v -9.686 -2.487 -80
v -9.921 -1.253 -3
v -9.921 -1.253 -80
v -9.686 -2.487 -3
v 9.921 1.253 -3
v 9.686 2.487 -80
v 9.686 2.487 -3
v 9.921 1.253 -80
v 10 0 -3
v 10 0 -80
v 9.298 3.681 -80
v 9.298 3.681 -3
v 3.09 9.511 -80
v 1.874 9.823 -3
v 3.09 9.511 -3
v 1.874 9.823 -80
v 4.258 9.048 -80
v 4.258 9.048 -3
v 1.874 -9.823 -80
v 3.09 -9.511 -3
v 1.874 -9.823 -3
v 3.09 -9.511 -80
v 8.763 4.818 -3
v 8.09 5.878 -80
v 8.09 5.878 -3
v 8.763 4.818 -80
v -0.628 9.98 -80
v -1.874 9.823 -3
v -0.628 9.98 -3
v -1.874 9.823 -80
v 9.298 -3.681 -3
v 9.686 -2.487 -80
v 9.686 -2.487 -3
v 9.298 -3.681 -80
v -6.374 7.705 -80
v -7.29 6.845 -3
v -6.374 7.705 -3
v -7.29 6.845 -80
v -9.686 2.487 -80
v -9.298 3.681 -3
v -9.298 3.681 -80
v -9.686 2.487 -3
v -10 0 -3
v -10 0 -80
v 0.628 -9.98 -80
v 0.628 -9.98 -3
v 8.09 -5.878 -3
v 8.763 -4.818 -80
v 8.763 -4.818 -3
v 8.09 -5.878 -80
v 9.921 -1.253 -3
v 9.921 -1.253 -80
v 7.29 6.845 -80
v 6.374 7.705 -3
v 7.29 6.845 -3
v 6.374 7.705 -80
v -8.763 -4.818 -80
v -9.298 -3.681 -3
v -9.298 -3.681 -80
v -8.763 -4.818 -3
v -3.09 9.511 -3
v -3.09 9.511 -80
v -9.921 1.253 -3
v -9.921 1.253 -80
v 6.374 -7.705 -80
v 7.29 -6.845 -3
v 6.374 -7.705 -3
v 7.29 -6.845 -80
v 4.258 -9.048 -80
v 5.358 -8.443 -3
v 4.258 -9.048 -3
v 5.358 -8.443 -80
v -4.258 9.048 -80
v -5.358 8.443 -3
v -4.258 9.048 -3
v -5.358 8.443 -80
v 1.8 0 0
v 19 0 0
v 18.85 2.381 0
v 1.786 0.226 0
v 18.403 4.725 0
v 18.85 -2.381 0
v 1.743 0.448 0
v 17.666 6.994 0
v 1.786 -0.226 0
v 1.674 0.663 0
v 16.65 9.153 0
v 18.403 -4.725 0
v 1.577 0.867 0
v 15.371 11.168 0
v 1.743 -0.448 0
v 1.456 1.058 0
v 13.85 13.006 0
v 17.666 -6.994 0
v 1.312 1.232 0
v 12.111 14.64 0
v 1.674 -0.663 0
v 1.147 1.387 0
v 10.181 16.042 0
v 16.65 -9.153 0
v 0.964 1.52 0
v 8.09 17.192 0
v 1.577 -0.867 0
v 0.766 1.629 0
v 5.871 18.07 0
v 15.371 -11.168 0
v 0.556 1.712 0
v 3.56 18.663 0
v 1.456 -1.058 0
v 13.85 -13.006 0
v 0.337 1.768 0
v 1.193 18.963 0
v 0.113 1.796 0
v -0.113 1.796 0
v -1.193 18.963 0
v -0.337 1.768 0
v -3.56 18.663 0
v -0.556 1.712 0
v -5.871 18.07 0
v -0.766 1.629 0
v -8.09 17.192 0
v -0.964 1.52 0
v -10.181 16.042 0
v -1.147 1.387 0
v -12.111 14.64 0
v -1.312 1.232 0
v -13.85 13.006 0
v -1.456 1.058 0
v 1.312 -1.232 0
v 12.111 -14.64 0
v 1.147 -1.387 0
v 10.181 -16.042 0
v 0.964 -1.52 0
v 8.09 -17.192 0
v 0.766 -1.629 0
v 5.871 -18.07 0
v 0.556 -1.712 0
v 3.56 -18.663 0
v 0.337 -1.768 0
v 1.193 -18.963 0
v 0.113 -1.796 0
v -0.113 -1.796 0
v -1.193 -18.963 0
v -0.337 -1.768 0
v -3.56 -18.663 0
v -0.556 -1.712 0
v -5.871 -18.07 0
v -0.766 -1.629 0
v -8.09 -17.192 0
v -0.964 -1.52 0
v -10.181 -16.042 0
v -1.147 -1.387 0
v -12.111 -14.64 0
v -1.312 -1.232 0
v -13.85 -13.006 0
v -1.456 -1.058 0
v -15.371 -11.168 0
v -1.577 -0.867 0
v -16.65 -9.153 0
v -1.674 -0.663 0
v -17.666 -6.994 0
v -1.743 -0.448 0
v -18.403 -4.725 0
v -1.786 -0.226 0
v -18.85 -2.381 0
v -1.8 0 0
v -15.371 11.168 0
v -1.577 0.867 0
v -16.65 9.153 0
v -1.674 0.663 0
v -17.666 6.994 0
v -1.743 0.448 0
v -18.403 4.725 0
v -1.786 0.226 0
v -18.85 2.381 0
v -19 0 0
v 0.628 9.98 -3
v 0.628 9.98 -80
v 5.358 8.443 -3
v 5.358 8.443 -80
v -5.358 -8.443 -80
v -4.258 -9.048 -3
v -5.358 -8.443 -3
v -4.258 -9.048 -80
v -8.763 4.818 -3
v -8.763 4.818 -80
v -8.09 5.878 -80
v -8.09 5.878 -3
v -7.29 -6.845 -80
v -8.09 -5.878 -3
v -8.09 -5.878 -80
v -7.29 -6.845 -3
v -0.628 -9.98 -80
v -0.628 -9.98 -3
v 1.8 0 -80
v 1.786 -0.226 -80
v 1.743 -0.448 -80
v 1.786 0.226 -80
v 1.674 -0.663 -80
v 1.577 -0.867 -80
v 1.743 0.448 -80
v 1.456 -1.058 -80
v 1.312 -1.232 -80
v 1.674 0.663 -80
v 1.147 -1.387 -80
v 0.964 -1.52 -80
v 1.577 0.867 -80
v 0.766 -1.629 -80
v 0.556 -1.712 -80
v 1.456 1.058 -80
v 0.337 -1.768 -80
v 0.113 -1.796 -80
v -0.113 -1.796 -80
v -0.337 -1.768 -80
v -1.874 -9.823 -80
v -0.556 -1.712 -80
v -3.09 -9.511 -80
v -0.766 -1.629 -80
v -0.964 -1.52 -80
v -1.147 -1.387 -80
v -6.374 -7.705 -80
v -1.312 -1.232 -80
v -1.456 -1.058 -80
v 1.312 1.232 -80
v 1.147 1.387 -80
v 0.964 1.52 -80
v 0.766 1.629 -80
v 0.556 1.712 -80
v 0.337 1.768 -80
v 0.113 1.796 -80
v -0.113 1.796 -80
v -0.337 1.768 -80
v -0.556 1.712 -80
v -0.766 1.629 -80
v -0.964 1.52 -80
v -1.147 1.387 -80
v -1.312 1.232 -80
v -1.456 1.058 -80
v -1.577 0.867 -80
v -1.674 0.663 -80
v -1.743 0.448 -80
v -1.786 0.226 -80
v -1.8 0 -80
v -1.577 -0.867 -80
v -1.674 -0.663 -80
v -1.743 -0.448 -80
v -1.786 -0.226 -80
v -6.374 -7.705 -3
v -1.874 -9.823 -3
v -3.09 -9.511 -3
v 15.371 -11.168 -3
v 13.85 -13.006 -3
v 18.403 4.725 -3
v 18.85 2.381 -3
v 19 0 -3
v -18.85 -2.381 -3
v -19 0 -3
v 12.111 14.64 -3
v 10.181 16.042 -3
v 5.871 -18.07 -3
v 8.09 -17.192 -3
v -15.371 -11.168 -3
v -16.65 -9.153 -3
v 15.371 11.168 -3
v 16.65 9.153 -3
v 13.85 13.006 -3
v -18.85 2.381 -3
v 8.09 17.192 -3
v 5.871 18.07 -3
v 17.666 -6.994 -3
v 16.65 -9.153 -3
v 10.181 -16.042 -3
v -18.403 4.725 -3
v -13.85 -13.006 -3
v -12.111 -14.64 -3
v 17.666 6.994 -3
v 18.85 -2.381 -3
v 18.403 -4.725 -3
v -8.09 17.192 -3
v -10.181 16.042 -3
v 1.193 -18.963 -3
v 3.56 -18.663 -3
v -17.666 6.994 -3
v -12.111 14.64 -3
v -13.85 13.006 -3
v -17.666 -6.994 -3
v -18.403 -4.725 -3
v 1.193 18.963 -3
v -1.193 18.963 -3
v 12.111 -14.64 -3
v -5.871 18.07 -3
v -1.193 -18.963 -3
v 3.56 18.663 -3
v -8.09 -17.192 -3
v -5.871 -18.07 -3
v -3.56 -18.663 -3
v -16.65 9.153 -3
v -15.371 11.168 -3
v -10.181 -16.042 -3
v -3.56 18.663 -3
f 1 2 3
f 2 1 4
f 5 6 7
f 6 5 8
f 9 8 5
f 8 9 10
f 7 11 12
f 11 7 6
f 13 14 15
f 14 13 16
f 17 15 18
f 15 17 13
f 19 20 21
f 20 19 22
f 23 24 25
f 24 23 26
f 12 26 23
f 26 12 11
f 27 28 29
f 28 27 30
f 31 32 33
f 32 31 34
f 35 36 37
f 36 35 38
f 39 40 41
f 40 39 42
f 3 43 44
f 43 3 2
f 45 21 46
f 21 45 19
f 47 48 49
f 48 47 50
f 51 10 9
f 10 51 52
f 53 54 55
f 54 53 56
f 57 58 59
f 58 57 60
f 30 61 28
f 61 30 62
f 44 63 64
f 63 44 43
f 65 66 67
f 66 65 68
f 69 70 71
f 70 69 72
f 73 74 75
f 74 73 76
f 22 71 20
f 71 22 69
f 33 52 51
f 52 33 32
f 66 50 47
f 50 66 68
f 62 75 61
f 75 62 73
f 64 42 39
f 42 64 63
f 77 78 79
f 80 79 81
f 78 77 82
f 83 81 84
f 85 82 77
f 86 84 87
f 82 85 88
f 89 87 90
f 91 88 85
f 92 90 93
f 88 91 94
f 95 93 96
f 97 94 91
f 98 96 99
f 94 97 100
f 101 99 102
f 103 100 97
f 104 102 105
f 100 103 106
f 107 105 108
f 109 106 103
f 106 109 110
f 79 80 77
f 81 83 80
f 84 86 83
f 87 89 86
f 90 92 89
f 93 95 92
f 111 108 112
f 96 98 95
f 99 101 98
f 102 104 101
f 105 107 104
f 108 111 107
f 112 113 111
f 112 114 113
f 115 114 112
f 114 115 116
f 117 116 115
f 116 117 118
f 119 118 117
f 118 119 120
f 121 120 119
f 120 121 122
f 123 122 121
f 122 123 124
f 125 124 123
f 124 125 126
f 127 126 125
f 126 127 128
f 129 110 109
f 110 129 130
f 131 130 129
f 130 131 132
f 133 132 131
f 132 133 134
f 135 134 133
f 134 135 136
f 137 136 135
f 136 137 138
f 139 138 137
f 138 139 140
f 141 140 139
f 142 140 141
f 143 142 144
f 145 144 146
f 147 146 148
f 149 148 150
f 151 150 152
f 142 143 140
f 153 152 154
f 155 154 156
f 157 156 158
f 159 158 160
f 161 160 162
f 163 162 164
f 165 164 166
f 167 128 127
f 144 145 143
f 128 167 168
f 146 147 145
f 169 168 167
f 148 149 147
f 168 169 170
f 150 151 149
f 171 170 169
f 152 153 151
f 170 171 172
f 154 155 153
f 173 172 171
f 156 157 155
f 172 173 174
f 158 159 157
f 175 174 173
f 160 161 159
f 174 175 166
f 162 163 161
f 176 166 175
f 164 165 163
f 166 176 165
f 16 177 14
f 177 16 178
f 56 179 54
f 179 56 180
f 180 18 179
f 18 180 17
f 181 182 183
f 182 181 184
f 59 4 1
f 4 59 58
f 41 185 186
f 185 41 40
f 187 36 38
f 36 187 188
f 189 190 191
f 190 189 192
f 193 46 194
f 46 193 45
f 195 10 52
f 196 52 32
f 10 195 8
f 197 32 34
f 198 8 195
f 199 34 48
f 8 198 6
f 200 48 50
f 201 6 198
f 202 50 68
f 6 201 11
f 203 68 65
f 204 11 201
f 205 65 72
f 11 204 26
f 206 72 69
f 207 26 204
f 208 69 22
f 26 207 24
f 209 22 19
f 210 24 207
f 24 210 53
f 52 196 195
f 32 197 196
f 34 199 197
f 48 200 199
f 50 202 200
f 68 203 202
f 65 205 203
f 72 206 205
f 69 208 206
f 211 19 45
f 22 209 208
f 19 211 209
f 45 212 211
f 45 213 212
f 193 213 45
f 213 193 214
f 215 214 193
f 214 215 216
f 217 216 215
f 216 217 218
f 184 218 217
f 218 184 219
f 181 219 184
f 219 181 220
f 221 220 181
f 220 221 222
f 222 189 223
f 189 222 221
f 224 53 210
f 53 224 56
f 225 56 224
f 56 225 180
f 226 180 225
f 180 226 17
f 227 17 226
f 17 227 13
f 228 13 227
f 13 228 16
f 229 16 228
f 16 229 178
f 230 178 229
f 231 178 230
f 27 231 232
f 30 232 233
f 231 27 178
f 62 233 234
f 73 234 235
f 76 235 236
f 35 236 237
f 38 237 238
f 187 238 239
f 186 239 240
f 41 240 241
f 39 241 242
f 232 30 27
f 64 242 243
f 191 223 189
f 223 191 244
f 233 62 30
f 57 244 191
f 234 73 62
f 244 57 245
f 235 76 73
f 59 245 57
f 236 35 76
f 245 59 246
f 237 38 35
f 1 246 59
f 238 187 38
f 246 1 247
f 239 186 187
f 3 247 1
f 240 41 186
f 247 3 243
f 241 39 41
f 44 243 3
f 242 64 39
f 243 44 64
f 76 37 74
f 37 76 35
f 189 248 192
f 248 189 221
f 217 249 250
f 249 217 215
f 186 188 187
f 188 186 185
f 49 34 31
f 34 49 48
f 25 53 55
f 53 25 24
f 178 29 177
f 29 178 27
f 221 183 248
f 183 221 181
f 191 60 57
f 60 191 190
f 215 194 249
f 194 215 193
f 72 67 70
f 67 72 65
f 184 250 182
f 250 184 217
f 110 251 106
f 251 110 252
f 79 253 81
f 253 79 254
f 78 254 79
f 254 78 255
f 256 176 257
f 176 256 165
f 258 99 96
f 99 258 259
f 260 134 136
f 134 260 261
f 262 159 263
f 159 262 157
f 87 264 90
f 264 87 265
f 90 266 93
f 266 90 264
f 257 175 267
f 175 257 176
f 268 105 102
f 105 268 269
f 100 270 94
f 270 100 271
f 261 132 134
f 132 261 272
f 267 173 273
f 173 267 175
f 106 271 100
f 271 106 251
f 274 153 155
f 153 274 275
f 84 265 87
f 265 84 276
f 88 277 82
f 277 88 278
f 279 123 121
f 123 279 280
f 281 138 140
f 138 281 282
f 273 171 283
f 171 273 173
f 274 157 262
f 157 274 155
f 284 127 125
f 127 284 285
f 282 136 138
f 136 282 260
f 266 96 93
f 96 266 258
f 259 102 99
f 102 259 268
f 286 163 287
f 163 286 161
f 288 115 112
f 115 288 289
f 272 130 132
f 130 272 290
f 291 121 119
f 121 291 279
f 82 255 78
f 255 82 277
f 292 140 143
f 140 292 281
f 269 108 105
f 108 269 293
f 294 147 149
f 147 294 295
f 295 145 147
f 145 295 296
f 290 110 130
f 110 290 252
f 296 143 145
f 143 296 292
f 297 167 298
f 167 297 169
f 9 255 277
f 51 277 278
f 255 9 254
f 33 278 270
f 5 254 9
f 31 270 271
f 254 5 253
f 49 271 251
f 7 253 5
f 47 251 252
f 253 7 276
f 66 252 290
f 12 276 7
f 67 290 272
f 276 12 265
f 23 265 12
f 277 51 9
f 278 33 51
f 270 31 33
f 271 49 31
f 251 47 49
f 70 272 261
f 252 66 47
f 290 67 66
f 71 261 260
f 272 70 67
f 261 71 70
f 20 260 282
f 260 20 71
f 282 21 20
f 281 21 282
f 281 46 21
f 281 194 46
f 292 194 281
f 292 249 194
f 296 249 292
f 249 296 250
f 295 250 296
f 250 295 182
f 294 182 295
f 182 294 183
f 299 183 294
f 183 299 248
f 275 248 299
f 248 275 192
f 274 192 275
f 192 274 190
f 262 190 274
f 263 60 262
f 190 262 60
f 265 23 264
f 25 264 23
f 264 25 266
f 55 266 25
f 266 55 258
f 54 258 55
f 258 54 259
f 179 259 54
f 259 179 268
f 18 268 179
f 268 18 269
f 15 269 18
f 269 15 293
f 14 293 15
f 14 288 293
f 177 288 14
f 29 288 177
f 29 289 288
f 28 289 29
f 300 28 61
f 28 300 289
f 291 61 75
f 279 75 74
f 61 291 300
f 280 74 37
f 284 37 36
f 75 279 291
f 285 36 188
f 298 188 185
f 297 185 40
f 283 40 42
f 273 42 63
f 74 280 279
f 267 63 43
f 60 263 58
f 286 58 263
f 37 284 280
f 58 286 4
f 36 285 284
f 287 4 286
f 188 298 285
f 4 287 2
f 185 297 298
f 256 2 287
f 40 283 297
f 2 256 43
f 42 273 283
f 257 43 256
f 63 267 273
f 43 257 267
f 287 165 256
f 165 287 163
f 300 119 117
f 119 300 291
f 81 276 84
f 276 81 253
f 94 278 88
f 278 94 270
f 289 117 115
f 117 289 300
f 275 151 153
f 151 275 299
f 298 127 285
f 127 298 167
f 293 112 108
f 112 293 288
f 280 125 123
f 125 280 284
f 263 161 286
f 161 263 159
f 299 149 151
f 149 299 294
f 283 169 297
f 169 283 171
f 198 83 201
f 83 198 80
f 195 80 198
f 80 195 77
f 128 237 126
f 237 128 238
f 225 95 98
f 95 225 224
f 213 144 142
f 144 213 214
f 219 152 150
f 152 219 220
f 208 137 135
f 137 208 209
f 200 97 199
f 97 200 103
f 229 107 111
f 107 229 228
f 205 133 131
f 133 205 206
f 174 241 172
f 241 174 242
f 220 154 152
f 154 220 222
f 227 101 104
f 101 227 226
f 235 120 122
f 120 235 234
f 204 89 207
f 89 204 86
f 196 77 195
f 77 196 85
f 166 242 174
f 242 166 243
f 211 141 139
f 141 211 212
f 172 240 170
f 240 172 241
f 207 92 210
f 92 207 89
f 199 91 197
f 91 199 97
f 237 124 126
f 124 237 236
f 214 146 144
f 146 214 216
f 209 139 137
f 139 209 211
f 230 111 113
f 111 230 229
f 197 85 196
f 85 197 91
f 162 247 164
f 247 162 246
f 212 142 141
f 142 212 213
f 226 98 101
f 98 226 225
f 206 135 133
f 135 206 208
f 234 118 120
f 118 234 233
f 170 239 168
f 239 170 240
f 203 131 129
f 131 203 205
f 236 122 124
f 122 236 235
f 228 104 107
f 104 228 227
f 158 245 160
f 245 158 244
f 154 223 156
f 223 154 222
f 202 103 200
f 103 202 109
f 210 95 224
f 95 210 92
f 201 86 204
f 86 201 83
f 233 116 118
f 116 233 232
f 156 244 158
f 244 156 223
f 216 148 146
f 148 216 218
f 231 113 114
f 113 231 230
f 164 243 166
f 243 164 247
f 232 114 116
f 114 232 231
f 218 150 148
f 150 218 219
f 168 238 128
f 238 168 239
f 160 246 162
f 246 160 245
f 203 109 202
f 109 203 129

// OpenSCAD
$fn = 50;


difference() {
	union() {
		translate(v = [0, 0, -80.0000000000]) {
			cylinder(h = 80, r = 10.0000000000);
		}
		translate(v = [0, 0, -3.0000000000]) {
			cylinder(h = 3, r = 19.0000000000);
		}
	}
	union() {
		#translate(v = [0, 0, -80]) {
			cylinder(h = 80, r = 1.8000000000);
		}
	}
}
